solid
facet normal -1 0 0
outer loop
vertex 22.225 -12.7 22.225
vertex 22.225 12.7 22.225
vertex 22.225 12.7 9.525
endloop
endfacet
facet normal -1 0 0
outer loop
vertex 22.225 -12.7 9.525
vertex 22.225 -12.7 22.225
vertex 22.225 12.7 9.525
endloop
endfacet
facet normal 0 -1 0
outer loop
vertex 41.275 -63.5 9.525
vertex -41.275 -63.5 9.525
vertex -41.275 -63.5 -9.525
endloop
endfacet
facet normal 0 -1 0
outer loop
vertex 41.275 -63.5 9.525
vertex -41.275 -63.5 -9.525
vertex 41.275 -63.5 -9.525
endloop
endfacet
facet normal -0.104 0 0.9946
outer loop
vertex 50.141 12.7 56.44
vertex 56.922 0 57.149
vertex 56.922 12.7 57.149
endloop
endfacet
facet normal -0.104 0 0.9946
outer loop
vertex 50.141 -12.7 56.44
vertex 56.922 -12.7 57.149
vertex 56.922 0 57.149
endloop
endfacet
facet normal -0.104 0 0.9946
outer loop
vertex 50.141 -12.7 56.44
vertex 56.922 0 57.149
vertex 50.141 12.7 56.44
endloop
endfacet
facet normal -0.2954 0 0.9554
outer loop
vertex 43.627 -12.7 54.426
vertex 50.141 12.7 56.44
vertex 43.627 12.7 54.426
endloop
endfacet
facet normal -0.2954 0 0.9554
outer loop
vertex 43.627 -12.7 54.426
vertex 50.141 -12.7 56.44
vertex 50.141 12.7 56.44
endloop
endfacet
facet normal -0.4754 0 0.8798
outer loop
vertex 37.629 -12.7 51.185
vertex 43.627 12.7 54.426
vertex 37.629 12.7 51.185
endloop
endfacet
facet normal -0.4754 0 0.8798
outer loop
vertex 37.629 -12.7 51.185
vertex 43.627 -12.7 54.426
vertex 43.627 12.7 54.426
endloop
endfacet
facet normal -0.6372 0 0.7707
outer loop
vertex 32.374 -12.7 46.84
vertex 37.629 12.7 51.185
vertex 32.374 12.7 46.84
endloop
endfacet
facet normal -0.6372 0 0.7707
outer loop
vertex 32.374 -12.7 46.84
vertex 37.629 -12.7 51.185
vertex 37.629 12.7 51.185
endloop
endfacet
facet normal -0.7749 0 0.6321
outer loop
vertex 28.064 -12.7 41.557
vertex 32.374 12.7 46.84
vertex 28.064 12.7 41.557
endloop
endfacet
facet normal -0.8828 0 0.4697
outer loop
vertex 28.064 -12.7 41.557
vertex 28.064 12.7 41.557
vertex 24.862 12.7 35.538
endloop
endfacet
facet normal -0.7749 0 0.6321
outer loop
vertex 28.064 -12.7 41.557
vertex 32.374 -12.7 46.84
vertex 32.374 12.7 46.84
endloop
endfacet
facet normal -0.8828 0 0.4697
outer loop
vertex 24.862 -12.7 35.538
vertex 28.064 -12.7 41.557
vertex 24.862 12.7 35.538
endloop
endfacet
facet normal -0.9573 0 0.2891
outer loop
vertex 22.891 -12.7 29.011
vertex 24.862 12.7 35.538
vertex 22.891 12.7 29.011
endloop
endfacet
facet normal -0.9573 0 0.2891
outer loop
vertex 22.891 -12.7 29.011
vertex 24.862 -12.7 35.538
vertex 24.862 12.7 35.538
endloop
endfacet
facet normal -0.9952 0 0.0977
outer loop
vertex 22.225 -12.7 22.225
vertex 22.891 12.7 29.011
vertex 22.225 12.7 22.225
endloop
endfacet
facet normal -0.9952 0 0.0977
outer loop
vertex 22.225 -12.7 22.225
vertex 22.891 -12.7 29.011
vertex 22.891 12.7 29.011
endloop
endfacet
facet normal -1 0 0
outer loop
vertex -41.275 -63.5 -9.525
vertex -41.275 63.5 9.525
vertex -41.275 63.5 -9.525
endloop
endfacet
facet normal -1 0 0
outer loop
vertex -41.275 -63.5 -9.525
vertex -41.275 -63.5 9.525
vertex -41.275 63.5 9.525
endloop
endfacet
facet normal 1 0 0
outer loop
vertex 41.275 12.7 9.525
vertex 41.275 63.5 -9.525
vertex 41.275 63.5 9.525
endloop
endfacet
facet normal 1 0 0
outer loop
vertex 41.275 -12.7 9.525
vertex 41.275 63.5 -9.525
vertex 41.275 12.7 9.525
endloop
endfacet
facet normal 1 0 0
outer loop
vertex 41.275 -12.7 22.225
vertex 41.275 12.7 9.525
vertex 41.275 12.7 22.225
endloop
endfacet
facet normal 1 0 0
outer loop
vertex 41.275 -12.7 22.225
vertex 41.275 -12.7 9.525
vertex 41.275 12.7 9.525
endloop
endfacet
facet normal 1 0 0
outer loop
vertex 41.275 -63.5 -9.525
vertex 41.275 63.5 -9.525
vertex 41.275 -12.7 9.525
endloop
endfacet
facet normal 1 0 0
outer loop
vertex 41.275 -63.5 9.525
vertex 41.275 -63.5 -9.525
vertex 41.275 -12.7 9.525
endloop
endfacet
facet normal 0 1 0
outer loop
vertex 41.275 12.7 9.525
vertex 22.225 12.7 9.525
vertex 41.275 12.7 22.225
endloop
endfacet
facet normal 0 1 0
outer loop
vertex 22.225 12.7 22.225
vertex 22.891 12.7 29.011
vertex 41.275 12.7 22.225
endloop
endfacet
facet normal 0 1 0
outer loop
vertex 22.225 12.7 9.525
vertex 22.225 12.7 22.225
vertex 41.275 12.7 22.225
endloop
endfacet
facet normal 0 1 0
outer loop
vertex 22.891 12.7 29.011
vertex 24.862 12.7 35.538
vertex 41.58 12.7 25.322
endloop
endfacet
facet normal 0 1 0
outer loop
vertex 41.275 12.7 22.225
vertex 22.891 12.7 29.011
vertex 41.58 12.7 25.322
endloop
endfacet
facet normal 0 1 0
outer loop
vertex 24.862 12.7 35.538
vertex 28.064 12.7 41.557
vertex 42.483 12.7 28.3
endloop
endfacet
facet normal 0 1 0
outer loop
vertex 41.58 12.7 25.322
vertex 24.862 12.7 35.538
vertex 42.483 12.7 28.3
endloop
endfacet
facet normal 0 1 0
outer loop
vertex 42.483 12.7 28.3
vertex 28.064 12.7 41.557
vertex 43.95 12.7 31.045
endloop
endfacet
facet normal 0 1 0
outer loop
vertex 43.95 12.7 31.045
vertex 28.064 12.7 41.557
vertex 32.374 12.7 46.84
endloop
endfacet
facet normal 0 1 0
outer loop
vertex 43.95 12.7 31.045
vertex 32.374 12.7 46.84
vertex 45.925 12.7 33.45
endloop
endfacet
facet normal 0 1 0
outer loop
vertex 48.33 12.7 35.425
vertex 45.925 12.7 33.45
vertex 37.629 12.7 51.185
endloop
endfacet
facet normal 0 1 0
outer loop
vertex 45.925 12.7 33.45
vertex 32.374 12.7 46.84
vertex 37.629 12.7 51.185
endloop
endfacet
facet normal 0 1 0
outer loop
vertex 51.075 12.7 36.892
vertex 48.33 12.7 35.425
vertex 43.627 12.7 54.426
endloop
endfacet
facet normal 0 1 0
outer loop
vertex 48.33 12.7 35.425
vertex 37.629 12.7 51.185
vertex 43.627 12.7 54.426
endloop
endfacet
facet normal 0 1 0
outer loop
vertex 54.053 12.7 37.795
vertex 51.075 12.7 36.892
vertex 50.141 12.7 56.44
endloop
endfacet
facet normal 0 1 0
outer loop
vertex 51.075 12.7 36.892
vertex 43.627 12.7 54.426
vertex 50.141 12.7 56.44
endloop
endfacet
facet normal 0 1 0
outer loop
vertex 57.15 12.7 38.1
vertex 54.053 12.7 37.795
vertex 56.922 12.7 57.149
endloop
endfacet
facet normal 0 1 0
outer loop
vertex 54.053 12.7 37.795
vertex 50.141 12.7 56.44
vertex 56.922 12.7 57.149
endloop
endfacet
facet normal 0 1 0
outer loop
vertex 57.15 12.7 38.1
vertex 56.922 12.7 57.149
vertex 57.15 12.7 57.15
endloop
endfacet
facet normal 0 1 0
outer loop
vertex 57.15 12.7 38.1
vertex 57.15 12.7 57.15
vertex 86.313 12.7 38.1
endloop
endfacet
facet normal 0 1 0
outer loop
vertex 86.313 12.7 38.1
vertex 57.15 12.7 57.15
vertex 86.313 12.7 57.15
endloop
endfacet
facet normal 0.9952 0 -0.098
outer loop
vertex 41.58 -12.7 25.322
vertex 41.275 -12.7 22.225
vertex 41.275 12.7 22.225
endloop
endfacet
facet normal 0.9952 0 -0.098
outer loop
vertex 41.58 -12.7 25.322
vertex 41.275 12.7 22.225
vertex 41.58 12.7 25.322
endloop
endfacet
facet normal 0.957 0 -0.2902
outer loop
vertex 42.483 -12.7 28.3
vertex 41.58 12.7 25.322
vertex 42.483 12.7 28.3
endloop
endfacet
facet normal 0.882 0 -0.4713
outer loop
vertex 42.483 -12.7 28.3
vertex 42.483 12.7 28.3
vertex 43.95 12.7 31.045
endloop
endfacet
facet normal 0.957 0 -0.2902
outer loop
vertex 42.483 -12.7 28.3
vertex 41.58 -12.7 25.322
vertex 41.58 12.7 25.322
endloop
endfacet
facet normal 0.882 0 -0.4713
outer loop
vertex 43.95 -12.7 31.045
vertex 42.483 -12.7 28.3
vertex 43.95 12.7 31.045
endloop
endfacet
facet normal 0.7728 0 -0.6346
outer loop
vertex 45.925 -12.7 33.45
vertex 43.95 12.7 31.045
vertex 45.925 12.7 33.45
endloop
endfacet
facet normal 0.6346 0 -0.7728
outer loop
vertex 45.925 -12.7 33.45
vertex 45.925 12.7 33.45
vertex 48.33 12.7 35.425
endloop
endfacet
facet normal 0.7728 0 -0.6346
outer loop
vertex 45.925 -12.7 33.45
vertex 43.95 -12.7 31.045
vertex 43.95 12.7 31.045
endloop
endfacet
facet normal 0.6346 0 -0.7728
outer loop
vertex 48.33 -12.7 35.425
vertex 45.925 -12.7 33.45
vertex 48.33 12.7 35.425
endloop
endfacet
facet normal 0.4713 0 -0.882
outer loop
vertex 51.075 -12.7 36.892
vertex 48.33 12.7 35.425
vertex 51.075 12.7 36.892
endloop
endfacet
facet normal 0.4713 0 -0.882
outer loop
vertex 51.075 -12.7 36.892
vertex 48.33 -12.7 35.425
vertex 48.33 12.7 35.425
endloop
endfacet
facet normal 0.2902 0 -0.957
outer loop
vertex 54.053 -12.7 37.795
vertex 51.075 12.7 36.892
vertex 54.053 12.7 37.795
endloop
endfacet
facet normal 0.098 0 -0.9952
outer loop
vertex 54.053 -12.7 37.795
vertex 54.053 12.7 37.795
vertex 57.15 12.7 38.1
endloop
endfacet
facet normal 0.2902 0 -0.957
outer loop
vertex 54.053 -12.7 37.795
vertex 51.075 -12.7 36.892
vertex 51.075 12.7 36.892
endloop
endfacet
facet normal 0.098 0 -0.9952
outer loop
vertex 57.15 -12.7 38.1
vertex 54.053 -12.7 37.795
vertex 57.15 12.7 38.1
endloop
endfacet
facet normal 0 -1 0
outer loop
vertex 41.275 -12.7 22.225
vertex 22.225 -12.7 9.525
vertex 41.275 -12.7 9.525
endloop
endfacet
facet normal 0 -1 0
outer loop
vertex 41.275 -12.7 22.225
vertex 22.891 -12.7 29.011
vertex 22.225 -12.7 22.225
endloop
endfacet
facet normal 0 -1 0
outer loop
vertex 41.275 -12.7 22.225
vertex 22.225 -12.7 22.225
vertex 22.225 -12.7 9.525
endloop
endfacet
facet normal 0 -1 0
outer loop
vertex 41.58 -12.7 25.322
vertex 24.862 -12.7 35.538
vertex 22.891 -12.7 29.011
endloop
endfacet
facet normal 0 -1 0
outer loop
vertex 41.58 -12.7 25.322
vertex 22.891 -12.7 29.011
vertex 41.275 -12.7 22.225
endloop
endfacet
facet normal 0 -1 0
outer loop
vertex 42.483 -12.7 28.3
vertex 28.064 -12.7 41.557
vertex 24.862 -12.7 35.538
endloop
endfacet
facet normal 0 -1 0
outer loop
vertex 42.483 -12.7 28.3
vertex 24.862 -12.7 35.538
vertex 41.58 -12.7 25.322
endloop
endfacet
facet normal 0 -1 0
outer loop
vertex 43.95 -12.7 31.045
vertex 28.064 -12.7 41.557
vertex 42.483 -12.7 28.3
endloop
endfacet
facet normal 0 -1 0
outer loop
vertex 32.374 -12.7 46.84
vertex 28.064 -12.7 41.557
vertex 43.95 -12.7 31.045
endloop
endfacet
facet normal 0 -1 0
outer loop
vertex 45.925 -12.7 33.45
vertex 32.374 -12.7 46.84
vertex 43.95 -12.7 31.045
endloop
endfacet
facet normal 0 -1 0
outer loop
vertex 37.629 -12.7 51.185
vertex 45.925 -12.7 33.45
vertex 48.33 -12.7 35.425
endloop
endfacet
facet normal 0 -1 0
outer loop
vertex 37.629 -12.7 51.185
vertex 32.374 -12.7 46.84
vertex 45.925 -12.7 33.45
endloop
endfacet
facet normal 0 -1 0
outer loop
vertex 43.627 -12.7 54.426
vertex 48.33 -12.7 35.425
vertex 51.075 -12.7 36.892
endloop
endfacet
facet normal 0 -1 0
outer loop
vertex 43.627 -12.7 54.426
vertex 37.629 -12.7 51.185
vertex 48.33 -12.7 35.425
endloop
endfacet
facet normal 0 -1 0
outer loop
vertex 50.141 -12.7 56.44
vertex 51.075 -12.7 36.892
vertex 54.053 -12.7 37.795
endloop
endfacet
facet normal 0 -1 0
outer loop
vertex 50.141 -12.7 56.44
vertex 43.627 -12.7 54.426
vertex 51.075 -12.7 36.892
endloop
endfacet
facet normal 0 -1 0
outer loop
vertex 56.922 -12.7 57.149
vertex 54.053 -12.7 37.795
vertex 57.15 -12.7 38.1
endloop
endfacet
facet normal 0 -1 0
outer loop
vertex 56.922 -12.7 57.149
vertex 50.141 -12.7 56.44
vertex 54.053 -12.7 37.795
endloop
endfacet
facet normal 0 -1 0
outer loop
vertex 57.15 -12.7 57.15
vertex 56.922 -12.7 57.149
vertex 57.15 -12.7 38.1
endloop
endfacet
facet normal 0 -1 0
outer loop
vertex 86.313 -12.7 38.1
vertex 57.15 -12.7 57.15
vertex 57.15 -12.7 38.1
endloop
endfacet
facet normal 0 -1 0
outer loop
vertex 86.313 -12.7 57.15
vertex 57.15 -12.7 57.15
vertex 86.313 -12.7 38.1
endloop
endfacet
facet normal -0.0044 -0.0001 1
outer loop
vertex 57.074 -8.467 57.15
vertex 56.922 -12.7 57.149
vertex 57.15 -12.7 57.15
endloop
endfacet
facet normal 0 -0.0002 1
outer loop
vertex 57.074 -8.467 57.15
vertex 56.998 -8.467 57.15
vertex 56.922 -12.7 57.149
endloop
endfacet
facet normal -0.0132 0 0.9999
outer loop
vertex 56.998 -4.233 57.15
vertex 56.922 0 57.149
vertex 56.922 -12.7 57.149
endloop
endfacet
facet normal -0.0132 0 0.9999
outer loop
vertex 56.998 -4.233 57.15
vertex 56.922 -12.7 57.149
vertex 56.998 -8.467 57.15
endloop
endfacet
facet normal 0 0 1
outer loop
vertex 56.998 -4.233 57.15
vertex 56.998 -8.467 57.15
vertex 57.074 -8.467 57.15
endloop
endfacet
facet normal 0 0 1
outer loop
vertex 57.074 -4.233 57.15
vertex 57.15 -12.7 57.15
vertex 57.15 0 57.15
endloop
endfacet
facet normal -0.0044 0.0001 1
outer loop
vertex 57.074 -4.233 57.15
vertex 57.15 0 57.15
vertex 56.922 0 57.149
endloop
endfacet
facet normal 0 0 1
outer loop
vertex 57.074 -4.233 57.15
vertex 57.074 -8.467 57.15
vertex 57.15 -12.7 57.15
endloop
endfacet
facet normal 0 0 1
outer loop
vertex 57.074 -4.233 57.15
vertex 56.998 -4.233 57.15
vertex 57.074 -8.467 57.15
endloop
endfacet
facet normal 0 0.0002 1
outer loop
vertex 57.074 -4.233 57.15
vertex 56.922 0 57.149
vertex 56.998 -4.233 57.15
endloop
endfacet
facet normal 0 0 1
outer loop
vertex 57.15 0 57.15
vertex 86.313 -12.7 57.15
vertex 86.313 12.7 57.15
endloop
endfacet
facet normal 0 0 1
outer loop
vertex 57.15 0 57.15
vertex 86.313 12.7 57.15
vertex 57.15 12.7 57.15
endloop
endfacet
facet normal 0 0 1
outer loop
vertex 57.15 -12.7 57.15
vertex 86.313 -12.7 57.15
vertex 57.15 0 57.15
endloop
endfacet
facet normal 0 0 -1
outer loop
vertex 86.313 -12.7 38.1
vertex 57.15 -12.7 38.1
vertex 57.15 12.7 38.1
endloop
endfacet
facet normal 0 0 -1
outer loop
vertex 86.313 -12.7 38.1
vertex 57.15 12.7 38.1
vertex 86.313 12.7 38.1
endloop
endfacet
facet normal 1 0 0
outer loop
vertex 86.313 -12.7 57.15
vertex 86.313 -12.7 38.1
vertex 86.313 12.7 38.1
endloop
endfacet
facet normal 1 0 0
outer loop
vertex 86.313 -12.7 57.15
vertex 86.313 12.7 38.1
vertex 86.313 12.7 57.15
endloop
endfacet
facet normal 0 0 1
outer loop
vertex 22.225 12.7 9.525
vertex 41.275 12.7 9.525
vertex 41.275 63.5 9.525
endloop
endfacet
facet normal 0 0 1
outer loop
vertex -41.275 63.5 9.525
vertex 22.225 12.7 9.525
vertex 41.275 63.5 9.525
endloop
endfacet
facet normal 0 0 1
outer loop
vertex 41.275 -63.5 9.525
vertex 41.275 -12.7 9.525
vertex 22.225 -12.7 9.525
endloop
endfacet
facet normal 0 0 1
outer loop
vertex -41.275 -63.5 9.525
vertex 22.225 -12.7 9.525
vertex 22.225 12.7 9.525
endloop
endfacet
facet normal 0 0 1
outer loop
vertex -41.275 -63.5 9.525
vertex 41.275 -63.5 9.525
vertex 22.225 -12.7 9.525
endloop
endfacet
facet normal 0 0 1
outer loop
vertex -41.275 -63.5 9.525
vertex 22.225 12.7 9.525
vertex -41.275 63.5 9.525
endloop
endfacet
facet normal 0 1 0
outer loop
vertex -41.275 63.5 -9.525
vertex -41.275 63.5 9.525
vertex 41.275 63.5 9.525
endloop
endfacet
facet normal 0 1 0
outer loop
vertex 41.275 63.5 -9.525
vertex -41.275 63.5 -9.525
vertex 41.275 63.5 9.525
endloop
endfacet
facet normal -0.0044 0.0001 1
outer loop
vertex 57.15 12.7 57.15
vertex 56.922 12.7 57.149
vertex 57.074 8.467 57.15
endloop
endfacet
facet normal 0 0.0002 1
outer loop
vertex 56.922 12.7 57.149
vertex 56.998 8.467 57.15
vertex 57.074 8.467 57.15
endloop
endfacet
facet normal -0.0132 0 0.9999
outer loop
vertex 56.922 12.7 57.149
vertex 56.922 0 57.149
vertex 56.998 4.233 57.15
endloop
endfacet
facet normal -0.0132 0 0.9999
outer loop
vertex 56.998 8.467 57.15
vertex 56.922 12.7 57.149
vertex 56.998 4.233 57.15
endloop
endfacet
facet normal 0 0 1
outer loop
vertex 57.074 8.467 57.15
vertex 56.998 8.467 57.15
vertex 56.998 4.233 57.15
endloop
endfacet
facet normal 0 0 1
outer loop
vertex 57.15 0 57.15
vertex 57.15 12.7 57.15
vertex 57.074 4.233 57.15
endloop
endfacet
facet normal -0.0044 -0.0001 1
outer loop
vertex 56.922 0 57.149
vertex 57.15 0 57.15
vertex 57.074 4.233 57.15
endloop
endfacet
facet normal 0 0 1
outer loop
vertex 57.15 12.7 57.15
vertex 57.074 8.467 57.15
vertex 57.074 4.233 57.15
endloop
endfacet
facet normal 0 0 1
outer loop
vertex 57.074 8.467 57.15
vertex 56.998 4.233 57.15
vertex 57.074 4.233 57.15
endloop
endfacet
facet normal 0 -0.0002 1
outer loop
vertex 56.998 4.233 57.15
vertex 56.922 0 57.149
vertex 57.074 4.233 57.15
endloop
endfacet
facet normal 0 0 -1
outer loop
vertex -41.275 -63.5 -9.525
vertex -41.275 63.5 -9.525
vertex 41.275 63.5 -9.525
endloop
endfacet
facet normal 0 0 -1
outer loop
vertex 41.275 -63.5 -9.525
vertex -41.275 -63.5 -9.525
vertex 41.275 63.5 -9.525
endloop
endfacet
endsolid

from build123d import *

# Parameters (mm, degrees)
F1_DEPTH = 63.5
F0_W     = 25.0981404377
F0_H     = 19.05
F2_DEPTH = 12.7


# Not quite as in the source:
# - a feature of the source that left no trace in its solid (it failed there, or was rolled back) is left out


with BuildPart() as f1:
    # F0 (on Front) → F1 (new body, symmetric)
    with BuildSketch(Plane.XZ):
        Polygon((-41.275, 9.525), (-41.275, -9.525), (41.275, -9.525), (41.275, 9.525), (22.225, 9.525), align=None)
    extrude(amount=F1_DEPTH, both=True)

    # F0 (on Front) → F2 (join, symmetric)
    with BuildSketch(Plane.XZ):
        with BuildLine():
            Line((22.225, 9.525), (41.275, 9.525))
            Line((41.275, 9.525), (41.275, 22.225))
            ThreePointArc((41.275, 22.225), (45.9246798487, 33.4503201513), (57.15, 38.1))
            Line((57.15, 38.1), (61.2148200089, 38.1))
            Line((61.2148200089, 38.1), (61.2148200089, 57.15))
            Line((61.2148200089, 57.15), (57.15, 57.15))
            add(Edge.make_bspline(
                [(56.9224584332, 57.1492587586), (56.9983070138, 57.1495642251), (57.0741542652, 57.1498113371), (57.15, 57.15)],
                knots=[109.1715172756, 109.1715172756, 109.1715172756, 109.1715172756, 109.3417635215, 109.3417635215, 109.3417635215, 109.3417635215], degree=3))
            ThreePointArc((56.9224584332, 57.1492587586), (32.3739781823, 46.8401247791), (22.225, 22.225))
            Line((22.225, 22.225), (22.225, 9.525))
        make_face()
        with Locations((73.7638902278, 47.625)):
            Rectangle(F0_W, F0_H)
    extrude(amount=F2_DEPTH, both=True)


solid = f1.part
